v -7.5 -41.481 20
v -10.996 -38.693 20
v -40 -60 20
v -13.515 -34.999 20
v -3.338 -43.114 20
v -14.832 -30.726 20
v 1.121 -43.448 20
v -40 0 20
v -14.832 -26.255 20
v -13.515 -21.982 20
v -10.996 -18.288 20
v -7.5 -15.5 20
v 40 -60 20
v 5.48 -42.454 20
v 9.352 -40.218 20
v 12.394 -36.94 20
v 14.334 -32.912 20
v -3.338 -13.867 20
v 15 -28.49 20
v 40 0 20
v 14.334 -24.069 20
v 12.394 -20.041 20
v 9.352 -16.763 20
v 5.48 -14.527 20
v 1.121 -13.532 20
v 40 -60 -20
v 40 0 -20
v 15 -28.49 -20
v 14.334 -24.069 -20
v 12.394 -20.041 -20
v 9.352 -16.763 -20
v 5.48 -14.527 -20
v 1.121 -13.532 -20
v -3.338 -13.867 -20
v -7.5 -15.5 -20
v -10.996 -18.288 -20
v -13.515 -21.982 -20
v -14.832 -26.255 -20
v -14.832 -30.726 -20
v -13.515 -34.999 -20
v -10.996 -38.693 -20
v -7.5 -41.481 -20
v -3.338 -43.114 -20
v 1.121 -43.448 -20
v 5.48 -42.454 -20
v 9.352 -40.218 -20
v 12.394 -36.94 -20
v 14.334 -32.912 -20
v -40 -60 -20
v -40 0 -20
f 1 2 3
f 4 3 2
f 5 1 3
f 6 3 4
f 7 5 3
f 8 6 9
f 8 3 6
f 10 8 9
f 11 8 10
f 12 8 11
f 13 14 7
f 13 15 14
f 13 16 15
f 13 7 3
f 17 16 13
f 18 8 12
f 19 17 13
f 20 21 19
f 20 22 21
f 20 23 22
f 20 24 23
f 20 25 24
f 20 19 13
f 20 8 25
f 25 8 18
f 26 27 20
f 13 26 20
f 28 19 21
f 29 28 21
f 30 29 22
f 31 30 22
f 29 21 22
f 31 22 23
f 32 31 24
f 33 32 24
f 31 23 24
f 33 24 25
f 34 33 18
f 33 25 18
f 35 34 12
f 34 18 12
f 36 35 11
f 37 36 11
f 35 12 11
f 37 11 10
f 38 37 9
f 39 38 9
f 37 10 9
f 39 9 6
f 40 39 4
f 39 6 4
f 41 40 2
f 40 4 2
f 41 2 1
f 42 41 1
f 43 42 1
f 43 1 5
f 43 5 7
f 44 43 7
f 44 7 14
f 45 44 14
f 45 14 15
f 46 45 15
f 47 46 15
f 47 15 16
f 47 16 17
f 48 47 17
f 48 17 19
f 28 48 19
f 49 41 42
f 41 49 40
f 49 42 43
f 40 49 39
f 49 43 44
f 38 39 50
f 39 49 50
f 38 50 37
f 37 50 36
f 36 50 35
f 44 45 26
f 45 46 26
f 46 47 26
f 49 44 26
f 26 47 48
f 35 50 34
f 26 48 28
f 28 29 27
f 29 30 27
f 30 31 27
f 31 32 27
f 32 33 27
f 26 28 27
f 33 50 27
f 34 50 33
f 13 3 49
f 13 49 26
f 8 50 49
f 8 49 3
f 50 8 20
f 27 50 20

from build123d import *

# Parameters (mm, degrees)
F0_W     = 80
F0_H     = 40
F1_DEPTH = 60
F2_R     = 15
F3_DEPTH = 40.001


with BuildPart() as f1:
    # F0 (on Front) → F1 (new body)
    with BuildSketch(Plane.XZ):
        Rectangle(F0_W, F0_H)
    extrude(amount=F1_DEPTH)

    # F2 (on face) → F3 (cut, through all)
    with BuildSketch(Plane.XY.offset(20)):
        with Locations((0, -28.49043)):
            Circle(F2_R)
    extrude(amount=-F3_DEPTH, mode=Mode.SUBTRACT)


solid = f1.part
